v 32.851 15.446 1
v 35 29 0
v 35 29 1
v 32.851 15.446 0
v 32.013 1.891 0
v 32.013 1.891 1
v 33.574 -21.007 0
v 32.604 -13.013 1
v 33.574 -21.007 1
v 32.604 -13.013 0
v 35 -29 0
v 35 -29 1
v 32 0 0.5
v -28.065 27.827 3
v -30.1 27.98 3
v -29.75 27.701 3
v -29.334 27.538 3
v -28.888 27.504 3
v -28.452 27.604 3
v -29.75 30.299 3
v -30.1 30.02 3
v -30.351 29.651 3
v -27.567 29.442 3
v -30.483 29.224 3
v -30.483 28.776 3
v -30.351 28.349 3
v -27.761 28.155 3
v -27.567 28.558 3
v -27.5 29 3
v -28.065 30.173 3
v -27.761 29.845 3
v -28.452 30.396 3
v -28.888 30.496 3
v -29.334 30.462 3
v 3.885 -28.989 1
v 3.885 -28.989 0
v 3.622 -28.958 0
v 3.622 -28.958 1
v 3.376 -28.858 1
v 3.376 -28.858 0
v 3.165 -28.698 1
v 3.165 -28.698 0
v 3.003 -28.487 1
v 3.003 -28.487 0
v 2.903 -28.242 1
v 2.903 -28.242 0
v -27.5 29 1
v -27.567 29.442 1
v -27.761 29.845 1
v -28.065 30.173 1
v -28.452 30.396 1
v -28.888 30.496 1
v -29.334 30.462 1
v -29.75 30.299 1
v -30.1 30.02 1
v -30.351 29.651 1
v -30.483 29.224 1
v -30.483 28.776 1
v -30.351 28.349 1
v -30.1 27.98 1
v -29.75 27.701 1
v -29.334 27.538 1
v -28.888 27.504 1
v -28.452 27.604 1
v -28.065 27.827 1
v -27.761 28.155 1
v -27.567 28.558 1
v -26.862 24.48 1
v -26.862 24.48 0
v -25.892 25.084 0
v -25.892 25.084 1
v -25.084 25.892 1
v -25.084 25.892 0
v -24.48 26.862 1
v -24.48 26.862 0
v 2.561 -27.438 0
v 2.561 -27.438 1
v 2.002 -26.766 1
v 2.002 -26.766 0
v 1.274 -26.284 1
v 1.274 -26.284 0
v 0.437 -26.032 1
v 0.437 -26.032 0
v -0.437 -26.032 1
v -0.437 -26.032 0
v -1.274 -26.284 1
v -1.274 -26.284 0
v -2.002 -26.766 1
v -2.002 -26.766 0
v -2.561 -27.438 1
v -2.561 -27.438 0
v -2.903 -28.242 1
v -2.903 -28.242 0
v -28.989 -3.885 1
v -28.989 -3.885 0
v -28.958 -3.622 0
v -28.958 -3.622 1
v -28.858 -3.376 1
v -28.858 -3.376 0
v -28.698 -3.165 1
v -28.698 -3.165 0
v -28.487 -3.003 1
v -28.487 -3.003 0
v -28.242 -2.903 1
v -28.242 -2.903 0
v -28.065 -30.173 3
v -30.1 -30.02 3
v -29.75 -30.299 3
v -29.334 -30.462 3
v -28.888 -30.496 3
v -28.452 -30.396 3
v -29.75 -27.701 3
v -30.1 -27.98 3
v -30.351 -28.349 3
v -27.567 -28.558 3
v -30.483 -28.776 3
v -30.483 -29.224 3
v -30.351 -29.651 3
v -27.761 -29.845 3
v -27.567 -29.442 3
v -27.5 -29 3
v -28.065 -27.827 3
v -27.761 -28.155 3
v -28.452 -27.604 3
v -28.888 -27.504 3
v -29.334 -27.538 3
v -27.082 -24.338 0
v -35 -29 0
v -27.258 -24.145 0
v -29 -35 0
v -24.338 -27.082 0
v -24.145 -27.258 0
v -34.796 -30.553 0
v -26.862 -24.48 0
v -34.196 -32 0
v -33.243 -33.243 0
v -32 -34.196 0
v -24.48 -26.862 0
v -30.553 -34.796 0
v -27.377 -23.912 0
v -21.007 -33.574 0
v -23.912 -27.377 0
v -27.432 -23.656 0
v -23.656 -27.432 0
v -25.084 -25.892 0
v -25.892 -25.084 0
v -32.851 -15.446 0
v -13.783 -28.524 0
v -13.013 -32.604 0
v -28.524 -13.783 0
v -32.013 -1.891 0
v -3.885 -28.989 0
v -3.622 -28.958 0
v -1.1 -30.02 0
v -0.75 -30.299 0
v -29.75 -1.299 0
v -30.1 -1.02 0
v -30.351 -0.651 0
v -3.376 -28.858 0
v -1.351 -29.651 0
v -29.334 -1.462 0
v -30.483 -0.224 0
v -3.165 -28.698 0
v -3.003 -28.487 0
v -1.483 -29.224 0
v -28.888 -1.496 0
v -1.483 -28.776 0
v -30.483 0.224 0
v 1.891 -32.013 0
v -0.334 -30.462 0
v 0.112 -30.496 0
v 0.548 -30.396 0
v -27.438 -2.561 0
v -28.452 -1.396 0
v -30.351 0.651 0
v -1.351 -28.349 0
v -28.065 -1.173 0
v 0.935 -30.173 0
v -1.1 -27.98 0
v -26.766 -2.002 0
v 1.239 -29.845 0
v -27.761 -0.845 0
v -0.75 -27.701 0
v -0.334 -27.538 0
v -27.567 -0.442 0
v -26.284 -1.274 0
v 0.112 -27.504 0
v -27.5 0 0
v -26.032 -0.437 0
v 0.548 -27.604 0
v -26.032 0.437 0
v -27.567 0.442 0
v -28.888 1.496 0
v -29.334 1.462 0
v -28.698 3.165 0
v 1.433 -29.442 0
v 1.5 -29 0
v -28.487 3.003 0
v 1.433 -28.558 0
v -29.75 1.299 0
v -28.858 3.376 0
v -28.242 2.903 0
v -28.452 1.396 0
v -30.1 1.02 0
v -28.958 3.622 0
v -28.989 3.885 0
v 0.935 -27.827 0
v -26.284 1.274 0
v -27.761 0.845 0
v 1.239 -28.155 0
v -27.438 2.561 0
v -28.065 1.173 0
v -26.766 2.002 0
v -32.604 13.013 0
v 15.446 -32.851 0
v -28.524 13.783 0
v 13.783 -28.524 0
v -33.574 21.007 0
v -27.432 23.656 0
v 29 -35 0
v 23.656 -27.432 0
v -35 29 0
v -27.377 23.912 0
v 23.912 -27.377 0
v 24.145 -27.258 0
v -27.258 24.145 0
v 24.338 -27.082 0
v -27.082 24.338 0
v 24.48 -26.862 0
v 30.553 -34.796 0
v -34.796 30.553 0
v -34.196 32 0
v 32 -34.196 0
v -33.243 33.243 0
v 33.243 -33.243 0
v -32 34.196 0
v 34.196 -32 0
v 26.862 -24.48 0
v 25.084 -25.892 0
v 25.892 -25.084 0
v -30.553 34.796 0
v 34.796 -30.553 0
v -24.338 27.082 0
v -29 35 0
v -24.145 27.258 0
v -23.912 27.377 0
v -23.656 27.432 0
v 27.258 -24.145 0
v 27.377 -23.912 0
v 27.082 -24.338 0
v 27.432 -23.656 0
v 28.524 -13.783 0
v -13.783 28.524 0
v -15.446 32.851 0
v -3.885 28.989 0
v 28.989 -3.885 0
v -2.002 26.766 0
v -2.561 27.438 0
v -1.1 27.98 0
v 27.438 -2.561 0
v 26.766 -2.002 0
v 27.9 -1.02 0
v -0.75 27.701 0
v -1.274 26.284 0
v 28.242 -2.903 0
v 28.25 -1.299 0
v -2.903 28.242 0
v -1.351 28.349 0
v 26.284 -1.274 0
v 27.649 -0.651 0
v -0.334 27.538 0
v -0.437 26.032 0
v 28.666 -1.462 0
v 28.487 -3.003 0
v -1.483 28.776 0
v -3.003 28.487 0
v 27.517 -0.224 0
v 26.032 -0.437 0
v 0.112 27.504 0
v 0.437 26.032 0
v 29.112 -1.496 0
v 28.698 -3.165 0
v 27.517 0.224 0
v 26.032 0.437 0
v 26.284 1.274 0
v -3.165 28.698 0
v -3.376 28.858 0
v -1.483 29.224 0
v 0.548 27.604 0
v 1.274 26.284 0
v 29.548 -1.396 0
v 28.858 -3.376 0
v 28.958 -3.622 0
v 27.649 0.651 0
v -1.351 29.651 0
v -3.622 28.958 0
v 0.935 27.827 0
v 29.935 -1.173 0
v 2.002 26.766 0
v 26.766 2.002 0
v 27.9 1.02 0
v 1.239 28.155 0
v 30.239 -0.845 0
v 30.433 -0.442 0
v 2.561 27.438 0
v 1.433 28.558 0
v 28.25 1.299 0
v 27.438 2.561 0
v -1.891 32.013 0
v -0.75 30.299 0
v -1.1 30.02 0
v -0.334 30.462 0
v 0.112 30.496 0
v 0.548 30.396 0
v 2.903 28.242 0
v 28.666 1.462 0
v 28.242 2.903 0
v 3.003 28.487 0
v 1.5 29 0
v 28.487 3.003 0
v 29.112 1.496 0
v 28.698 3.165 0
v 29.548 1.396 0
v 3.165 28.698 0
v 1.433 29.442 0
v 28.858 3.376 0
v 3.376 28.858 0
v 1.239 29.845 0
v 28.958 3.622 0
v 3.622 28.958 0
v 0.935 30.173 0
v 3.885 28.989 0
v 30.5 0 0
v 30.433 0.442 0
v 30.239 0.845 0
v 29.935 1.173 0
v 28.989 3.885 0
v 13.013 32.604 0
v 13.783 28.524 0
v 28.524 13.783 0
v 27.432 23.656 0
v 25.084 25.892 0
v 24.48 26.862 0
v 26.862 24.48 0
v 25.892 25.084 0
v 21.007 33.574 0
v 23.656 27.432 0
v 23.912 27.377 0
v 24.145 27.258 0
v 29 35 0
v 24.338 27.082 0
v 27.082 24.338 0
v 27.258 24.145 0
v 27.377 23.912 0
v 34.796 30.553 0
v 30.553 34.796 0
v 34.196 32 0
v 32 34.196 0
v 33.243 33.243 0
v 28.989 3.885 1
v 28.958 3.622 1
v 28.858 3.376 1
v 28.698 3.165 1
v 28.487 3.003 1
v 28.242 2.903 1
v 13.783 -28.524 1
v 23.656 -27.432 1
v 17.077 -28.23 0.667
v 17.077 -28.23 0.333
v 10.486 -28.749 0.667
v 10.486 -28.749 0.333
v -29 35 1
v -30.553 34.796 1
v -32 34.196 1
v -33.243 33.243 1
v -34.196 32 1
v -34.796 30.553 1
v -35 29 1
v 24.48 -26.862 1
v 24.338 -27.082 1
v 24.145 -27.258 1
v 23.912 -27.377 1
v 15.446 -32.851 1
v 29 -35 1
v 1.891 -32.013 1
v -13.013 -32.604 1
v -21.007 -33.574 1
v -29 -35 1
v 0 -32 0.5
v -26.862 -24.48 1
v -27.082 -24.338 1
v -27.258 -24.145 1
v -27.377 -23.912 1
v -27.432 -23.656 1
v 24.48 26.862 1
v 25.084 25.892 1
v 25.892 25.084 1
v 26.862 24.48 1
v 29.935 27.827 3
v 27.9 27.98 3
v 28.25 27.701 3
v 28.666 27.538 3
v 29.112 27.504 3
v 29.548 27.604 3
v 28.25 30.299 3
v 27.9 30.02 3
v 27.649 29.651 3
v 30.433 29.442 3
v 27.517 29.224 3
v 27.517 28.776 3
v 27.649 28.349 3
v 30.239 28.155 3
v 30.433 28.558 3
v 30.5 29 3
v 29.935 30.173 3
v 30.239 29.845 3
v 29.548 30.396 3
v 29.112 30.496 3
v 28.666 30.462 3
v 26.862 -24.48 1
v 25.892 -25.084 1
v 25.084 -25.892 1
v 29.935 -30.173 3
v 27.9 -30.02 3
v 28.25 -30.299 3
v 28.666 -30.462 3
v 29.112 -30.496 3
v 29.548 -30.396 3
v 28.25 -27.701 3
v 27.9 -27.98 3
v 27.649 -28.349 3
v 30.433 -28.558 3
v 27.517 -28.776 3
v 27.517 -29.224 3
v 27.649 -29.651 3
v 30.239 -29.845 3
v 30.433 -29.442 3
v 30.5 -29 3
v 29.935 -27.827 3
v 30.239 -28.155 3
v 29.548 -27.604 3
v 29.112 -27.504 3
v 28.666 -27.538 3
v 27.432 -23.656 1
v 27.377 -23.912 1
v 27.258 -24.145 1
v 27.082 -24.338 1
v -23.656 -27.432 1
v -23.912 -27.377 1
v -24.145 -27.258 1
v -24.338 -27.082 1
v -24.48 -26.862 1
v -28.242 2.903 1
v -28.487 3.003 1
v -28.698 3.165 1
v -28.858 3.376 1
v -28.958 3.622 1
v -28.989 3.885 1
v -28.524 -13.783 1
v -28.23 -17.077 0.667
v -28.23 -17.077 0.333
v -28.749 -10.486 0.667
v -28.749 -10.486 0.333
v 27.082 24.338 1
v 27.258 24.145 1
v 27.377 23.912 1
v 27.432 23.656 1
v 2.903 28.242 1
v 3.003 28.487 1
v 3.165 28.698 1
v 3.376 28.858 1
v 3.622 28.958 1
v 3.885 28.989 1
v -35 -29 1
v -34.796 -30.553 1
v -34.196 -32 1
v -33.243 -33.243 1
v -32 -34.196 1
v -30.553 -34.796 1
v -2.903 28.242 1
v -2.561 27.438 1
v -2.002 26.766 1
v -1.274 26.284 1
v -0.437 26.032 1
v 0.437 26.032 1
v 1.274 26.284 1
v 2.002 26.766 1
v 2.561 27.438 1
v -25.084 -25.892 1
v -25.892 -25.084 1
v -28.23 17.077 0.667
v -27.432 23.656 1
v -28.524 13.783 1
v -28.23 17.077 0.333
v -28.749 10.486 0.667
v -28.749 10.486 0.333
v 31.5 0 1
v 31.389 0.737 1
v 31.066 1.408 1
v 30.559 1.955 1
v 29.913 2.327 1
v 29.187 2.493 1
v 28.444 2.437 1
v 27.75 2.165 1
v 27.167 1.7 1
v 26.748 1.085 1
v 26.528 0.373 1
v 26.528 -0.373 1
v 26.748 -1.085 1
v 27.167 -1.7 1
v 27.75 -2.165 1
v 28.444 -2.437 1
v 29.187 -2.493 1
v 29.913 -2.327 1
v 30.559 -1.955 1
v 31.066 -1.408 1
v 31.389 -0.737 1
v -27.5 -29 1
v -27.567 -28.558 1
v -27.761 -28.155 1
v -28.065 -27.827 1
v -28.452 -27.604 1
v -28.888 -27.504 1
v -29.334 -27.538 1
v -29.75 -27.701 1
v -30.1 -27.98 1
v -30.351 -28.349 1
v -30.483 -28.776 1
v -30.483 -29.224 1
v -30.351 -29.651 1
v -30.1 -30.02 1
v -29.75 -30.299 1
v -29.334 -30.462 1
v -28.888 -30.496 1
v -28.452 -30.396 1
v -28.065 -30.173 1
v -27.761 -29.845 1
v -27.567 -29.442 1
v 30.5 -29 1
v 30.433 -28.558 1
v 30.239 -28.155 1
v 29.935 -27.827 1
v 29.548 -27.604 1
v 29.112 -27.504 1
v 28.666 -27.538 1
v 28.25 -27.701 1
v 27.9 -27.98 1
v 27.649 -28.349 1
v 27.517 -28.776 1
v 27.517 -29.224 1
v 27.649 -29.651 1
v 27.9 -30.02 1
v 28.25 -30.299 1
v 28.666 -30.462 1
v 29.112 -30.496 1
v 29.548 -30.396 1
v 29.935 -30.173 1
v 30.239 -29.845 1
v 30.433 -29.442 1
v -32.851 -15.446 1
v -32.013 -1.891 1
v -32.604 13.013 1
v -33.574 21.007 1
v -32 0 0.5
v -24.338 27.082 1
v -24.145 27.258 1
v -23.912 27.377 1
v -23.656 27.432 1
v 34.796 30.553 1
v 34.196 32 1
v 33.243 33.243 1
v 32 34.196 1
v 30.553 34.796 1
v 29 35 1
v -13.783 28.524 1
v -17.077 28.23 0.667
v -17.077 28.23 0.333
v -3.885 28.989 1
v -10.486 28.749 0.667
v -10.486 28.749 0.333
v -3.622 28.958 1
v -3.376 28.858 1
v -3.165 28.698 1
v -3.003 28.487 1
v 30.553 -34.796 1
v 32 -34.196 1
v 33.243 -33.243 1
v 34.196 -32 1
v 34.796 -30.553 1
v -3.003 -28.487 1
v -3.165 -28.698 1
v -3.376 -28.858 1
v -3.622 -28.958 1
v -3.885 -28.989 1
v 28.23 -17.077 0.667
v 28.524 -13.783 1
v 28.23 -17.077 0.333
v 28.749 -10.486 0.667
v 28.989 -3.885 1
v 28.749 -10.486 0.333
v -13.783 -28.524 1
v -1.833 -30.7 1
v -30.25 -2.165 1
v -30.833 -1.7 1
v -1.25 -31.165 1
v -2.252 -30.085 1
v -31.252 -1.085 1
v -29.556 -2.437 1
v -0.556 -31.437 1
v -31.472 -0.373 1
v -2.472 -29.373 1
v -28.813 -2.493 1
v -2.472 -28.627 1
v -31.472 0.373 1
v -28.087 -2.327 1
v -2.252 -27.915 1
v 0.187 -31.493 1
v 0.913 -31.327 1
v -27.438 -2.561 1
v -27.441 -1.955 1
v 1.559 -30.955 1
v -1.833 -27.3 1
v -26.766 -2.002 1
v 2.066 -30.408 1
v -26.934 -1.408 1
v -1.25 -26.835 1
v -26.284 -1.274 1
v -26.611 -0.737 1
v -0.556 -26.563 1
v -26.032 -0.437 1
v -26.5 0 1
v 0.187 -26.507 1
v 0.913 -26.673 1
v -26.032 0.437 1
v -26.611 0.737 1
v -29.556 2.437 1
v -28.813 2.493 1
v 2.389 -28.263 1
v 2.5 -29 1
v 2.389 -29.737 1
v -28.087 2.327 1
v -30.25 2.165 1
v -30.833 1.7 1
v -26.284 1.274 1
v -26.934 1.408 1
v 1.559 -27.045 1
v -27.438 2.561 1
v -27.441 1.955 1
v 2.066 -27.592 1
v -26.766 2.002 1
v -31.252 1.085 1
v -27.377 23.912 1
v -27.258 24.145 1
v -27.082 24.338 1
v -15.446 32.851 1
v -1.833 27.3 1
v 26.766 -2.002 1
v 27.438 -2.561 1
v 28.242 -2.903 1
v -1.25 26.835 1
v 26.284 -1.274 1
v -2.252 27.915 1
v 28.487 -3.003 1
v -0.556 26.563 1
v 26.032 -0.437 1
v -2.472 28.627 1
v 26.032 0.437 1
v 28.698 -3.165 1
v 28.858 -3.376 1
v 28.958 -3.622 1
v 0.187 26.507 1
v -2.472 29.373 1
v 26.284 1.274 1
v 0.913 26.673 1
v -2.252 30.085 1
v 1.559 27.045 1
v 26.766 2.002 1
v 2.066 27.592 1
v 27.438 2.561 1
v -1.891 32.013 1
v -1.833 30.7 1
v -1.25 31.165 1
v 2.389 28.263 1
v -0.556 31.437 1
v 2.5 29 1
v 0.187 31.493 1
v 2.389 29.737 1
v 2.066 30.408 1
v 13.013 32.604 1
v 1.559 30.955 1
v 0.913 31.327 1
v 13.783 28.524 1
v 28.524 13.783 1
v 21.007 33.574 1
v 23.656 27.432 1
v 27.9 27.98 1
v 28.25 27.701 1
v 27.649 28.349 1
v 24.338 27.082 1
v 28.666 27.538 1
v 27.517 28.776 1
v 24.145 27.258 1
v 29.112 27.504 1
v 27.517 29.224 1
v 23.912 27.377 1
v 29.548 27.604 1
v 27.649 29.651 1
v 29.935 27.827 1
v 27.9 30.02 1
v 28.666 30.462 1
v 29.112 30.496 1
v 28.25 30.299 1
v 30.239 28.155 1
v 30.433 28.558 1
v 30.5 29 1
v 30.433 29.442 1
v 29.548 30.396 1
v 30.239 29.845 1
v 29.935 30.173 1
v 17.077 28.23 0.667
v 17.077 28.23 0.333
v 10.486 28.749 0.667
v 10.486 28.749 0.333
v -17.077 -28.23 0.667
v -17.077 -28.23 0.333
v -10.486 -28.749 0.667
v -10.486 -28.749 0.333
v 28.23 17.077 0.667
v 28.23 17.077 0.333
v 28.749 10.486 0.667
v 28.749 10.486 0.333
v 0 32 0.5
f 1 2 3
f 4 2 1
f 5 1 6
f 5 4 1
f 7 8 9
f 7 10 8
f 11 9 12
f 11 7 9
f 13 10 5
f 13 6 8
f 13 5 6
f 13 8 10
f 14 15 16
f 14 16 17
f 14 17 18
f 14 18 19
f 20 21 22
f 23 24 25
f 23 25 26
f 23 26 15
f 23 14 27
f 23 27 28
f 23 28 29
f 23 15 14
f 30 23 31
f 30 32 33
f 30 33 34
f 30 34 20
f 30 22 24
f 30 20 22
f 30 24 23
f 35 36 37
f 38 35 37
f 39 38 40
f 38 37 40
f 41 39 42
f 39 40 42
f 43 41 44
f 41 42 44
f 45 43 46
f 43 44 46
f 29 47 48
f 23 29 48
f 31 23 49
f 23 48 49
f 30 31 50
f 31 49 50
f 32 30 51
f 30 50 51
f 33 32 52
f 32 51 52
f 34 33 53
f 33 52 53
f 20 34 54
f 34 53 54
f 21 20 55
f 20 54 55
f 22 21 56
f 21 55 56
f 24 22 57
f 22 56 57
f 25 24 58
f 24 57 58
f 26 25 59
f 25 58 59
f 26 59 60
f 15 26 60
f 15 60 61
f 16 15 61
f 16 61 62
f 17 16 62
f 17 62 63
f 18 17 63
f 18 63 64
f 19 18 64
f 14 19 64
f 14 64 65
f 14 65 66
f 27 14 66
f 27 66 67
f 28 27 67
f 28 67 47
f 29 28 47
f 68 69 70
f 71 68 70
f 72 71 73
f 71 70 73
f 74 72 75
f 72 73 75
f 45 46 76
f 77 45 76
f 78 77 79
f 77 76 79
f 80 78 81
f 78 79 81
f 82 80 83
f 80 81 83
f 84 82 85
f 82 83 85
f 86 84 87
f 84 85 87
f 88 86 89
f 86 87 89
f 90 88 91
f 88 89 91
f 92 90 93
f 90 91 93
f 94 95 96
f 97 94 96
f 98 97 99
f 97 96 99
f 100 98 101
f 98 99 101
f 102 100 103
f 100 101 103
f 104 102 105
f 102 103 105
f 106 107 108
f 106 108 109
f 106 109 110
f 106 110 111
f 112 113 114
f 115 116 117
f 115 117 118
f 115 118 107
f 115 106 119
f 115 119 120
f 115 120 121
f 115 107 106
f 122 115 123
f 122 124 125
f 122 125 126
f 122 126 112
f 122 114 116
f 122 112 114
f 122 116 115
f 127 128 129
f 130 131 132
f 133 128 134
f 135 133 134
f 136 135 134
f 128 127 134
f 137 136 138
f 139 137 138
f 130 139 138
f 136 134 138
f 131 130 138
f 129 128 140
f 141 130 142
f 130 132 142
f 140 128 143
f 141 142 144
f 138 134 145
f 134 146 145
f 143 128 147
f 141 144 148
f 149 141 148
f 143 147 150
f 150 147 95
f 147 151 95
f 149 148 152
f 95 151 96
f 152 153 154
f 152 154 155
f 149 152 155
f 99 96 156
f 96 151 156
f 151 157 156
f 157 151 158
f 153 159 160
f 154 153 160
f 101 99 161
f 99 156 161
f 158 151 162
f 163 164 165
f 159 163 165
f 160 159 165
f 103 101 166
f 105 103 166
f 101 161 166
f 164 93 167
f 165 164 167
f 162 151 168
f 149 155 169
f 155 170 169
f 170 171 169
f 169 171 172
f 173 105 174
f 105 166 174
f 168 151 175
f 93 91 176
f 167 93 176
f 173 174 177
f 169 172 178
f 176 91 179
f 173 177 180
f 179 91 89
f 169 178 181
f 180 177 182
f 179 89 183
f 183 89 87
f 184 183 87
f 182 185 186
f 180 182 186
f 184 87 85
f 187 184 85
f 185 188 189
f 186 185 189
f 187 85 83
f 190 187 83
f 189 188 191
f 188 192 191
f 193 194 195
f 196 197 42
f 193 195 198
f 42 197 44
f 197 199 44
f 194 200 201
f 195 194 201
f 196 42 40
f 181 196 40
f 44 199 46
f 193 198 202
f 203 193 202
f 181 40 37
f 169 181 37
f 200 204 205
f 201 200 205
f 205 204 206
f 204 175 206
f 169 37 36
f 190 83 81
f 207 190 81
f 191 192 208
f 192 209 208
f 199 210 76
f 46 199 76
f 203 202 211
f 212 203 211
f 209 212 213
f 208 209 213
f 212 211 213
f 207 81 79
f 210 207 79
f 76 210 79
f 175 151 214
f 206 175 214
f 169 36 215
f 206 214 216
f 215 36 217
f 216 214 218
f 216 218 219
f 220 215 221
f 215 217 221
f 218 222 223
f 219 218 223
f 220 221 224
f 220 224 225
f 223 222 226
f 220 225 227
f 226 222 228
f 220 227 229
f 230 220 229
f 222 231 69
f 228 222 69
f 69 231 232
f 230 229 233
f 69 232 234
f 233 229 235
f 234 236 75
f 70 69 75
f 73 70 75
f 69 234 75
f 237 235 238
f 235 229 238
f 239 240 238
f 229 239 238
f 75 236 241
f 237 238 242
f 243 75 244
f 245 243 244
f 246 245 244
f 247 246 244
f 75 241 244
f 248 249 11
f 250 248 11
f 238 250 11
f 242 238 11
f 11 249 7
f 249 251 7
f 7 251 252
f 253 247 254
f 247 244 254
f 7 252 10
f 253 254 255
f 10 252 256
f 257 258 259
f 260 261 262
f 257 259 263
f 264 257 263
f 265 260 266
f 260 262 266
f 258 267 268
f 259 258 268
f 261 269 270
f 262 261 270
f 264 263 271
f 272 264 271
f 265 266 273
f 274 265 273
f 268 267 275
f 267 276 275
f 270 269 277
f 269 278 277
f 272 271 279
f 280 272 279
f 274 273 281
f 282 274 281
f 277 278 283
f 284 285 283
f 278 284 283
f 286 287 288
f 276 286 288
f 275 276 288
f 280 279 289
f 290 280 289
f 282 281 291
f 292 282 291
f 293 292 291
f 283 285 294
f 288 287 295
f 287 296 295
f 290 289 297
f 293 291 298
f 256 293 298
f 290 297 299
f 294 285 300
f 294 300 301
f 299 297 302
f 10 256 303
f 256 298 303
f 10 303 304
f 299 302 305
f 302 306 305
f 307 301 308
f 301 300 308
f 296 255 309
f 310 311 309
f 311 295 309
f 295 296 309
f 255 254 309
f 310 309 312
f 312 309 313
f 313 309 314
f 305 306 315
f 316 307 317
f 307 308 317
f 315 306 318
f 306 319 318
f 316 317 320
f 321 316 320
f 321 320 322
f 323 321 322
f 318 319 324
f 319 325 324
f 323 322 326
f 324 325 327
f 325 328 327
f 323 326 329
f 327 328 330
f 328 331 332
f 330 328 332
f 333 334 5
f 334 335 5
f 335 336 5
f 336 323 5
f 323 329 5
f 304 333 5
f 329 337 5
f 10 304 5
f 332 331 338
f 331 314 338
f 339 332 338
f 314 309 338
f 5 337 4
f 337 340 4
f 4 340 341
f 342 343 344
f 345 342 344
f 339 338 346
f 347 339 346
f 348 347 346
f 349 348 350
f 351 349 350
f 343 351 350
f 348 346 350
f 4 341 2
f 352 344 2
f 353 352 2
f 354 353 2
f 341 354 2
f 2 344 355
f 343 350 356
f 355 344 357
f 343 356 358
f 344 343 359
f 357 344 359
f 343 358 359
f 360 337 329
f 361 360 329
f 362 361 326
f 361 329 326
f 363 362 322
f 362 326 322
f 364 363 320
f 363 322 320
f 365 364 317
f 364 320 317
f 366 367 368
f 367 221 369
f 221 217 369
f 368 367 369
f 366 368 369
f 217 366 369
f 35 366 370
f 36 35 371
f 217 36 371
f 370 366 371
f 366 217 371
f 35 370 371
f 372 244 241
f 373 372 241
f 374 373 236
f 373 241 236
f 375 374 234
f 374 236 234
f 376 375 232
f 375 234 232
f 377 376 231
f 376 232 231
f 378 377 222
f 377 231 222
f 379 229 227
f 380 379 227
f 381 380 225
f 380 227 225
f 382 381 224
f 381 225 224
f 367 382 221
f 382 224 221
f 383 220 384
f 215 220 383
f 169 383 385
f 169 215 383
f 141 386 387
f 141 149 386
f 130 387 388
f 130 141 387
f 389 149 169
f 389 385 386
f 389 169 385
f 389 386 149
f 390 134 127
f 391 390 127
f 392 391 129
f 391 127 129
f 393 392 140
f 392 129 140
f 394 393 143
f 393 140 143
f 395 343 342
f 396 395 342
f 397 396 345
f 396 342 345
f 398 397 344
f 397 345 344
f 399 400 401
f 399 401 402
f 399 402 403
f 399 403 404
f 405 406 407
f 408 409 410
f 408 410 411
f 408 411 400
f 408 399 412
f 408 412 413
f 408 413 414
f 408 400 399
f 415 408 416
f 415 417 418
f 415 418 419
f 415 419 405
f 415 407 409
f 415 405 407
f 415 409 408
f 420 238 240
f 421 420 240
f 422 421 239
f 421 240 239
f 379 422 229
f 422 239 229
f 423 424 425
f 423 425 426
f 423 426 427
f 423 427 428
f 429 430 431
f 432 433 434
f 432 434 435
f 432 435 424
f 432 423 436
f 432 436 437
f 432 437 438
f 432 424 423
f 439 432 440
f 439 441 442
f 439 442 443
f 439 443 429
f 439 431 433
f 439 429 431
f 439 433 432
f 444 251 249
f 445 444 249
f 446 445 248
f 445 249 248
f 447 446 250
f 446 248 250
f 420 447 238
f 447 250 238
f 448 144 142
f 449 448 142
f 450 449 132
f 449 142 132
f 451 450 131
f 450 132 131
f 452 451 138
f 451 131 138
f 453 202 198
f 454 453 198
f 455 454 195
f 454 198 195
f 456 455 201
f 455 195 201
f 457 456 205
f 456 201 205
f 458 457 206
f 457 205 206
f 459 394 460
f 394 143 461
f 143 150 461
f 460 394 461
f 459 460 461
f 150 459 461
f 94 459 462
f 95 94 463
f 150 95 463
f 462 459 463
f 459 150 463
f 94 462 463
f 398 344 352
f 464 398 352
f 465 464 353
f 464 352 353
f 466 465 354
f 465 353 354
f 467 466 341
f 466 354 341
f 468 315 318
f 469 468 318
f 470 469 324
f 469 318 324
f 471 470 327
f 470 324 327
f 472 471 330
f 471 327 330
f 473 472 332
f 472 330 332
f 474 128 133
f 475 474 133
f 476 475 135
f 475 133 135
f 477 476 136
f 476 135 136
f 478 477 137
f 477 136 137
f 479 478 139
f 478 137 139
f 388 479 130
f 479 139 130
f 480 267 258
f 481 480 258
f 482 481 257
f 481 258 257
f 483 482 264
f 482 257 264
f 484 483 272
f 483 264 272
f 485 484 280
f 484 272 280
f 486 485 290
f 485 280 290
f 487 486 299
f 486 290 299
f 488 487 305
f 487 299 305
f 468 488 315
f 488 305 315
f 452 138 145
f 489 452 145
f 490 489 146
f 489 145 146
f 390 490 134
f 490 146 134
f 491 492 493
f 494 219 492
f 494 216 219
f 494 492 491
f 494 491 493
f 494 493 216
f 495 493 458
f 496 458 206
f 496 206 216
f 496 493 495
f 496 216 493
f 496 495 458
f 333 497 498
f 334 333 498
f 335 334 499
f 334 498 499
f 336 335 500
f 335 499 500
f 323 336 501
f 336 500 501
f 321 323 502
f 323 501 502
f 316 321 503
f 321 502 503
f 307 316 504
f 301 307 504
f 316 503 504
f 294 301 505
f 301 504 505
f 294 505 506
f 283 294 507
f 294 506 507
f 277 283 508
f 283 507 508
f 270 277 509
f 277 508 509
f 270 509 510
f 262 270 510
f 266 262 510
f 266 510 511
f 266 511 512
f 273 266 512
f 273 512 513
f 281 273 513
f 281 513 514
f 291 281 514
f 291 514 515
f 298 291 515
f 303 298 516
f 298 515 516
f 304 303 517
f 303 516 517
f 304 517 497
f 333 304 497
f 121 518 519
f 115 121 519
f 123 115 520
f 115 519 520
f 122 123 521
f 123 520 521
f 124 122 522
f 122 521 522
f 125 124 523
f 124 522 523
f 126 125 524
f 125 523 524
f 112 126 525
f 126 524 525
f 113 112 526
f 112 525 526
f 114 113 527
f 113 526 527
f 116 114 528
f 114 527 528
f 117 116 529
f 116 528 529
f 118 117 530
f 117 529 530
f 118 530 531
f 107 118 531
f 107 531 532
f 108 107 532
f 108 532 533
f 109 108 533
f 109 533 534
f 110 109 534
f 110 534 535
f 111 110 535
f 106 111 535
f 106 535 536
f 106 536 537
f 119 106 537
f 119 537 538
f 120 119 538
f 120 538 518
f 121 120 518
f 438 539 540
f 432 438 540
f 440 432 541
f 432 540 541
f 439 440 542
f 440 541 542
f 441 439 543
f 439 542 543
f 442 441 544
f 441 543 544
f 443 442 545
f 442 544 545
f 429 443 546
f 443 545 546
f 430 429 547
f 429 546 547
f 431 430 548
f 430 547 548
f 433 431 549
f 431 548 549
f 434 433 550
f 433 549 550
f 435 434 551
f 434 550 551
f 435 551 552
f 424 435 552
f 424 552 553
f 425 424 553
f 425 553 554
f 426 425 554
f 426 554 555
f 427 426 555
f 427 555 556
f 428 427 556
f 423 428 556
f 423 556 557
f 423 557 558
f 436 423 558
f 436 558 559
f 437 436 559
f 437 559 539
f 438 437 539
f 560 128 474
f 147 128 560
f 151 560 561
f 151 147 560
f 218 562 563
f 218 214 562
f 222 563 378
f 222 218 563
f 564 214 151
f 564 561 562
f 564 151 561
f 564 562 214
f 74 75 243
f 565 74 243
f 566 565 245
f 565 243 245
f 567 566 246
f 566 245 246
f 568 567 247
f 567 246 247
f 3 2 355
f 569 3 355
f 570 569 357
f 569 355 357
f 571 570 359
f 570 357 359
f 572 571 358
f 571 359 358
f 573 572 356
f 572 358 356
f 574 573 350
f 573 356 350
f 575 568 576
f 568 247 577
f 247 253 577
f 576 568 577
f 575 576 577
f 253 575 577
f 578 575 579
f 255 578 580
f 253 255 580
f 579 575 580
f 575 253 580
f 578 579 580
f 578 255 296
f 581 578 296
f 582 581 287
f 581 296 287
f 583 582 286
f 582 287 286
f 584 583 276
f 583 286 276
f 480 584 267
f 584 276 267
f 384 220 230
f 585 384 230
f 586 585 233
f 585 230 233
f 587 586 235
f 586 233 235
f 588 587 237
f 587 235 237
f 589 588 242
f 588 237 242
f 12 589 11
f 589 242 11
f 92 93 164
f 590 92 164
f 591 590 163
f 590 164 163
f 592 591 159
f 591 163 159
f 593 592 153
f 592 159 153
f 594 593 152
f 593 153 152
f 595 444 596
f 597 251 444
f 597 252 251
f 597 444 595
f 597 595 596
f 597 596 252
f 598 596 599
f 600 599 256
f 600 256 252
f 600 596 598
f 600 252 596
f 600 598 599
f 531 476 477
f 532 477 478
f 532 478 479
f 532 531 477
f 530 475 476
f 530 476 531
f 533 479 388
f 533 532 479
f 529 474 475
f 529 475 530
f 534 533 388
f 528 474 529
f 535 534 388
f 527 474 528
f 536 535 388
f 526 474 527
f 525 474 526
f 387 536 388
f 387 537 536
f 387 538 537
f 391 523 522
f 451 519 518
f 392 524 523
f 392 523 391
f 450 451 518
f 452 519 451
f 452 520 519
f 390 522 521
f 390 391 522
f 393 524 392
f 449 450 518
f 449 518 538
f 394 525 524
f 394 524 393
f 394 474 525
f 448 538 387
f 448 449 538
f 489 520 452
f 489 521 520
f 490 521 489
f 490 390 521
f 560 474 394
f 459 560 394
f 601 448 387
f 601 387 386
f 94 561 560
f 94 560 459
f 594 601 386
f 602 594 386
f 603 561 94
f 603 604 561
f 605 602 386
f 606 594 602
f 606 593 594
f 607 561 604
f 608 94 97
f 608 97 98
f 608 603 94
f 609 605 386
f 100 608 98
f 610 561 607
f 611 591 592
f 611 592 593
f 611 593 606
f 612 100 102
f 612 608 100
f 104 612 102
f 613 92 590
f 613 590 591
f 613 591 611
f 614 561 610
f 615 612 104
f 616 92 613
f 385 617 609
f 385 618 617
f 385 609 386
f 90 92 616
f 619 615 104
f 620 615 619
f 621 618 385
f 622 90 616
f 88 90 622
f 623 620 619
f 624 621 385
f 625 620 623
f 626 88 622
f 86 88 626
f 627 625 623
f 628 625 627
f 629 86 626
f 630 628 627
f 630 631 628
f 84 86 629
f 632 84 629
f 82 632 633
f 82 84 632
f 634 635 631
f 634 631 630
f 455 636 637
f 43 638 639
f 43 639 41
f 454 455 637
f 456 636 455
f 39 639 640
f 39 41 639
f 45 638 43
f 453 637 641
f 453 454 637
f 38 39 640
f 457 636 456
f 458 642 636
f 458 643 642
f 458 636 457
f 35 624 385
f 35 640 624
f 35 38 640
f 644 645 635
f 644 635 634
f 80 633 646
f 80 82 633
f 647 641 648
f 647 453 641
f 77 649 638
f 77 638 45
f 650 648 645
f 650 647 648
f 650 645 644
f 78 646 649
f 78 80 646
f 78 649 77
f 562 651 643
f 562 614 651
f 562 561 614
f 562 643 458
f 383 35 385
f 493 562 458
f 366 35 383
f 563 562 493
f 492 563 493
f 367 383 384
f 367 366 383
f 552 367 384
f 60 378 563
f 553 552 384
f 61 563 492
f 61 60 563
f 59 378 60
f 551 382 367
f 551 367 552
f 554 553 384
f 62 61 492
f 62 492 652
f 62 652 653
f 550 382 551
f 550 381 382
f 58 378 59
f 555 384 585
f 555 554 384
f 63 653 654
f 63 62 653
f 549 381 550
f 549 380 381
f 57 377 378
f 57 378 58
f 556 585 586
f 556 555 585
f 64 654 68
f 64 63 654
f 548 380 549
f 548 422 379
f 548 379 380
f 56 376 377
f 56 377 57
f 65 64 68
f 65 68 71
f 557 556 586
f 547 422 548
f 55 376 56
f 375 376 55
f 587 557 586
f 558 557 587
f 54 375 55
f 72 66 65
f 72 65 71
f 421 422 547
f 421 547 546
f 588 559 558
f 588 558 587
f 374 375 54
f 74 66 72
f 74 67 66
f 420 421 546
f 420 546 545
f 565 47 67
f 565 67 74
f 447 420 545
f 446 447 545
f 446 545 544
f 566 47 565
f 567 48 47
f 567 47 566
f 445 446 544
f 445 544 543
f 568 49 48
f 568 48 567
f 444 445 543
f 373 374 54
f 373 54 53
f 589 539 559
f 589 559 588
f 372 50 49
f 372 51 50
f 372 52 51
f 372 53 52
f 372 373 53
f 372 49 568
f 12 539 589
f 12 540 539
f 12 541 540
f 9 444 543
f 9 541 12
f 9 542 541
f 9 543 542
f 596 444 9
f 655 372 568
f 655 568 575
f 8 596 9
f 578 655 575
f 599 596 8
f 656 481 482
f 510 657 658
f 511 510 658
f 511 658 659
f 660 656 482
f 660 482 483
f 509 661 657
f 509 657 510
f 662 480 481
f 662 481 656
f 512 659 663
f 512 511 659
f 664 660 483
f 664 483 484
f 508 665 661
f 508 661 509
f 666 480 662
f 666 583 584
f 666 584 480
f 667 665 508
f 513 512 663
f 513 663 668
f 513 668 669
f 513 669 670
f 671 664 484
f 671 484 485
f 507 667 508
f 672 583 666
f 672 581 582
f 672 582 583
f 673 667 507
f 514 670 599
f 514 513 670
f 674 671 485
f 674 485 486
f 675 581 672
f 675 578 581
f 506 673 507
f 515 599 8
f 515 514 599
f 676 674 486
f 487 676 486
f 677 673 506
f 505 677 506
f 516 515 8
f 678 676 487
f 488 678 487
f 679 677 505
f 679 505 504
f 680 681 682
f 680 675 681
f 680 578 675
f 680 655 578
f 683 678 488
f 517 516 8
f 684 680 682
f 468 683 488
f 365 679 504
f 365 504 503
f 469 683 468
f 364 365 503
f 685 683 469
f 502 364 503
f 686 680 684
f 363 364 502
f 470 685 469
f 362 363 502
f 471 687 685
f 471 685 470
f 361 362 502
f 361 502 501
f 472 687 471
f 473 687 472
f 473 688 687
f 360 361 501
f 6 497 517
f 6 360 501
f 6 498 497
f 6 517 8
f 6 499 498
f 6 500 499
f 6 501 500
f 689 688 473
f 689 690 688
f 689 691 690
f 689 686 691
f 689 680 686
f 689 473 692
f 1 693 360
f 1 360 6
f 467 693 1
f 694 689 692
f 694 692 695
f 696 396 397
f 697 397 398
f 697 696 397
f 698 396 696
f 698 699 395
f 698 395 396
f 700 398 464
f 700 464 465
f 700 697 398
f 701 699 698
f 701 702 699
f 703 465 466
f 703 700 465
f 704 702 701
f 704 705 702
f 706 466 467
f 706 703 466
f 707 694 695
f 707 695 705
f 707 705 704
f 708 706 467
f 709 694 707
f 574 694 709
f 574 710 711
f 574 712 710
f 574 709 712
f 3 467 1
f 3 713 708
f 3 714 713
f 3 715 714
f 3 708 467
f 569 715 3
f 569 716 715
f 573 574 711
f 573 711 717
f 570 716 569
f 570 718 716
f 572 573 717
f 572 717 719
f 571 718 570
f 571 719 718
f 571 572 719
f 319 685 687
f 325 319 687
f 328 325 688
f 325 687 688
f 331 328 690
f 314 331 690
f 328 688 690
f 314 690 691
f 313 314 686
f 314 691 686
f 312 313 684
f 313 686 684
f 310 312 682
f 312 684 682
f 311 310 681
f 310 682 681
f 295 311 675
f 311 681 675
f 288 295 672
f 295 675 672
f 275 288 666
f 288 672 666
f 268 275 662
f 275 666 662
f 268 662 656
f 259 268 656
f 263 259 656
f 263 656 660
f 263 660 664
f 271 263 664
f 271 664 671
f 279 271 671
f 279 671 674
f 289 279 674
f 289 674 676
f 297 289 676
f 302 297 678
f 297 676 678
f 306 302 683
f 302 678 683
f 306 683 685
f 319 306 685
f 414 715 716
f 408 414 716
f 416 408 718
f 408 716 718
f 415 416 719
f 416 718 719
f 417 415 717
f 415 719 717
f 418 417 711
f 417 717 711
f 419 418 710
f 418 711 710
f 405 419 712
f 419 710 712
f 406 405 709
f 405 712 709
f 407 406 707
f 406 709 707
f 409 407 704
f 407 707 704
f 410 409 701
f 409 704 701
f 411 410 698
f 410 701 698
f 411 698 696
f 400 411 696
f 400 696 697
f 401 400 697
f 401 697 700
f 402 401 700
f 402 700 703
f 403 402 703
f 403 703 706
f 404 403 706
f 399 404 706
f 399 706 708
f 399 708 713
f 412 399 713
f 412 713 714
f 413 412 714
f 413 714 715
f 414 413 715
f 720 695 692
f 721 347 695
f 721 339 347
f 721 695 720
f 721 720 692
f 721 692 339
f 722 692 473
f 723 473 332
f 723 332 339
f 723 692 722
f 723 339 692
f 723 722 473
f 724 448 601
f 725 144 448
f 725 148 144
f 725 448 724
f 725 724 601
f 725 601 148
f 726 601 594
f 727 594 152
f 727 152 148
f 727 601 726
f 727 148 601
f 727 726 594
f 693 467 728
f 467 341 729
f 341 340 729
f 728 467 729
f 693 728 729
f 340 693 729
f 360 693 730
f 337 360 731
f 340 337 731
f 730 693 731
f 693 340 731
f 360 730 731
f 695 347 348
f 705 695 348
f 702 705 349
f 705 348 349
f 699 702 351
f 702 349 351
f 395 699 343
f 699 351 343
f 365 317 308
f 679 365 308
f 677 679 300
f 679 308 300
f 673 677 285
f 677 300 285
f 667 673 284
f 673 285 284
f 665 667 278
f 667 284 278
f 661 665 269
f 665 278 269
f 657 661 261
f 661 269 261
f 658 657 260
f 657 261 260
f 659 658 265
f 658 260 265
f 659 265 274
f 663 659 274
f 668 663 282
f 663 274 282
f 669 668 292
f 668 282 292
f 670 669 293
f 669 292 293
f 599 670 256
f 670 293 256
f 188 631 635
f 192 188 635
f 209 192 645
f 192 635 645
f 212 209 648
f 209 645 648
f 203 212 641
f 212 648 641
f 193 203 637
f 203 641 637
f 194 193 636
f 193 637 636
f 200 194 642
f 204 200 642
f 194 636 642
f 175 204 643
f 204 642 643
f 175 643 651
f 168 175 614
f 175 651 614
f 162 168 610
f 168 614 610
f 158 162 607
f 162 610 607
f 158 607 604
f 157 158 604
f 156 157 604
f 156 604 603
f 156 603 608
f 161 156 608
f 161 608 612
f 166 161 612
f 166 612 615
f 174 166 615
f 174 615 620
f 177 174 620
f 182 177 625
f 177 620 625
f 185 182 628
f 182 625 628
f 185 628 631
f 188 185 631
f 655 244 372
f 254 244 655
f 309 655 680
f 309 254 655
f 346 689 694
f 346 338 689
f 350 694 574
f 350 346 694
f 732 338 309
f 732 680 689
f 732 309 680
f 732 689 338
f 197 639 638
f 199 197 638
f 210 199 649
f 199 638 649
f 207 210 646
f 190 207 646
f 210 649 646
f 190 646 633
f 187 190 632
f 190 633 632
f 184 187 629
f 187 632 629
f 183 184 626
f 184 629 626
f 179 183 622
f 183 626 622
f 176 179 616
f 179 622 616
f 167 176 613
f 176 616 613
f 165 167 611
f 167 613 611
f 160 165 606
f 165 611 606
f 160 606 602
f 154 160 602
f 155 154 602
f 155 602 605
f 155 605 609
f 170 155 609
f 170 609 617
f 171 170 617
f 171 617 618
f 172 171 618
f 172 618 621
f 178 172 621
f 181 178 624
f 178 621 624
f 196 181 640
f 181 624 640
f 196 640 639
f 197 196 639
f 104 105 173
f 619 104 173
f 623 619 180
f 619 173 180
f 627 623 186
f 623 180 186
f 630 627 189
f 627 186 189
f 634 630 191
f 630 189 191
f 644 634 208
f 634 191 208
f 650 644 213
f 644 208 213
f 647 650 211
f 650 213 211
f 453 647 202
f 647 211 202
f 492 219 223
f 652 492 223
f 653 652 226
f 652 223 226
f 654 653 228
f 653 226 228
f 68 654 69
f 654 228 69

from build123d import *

# Parameters (mm, degrees)
IZIM3_R                          = 1.5
Y_KSEKLIK_EKSTR_ZYON3_DEPTH      = 1
PAH1_SIZE                        = 1
Y_KSEKLIK_EKSTR_ZYON5_DEPTH      = 2
Y_KSEKLIK_EKSTR_ZYON5_DEPTH_BACK = 1
IZIM5_R                          = 1.5
Y_KSEKLIK_EKSTR_ZYON4_DEPTH      = 2
Y_KSEKLIK_EKSTR_ZYON4_DEPTH_BACK = 1
IZIM4_R                          = 1.5


with BuildPart() as part:
    # Çizim3 → Yükseklik-Ekstrüzyon3 (new body)
    with BuildSketch(Plane.XY):
        with BuildLine():
            ThreePointArc((-29, 35), (-33.242640687, 33.242640687), (-35, 29))
            add(Edge.make_bspline(
                [(-35, -29), (-29, 0), (-35, 29)],
                knots=[0, 0, 0, 1, 1, 1], degree=2))
            ThreePointArc((-35, -29), (-33.242640687, -33.242640687), (-29, -35))
            add(Edge.make_bspline(
                [(29, -35), (0, -29), (-29, -35)],
                knots=[0, 0, 0, 1, 1, 1], degree=2))
            ThreePointArc((29, -35), (33.242640687, -33.242640687), (35, -29))
            add(Edge.make_bspline(
                [(35, 29), (29, 0), (35, -29)],
                knots=[0, 0, 0, 1, 1, 1], degree=2))
            ThreePointArc((35, 29), (33.242640687, 33.242640687), (29, 35))
            add(Edge.make_bspline(
                [(-29, 35), (0, 29), (29, 35)],
                knots=[0, 0, 0, 1, 1, 1], degree=2))
        make_face()
        with Locations((0, -29)):
            Circle(IZIM3_R, mode=Mode.SUBTRACT)
        with Locations((-29, 0)):
            Circle(IZIM3_R, mode=Mode.SUBTRACT)
        with Locations((-29, 29)):
            Circle(IZIM3_R, mode=Mode.SUBTRACT)
        with Locations((29, 29)):
            Circle(IZIM3_R, mode=Mode.SUBTRACT)
        with Locations((-29, -29)):
            Circle(IZIM3_R, mode=Mode.SUBTRACT)
        with Locations((29, -29)):
            Circle(IZIM3_R, mode=Mode.SUBTRACT)
        with Locations((0, 29)):
            Circle(IZIM3_R, mode=Mode.SUBTRACT)
        with Locations((29, 0)):
            Circle(IZIM3_R, mode=Mode.SUBTRACT)
        with BuildLine():
            ThreePointArc((-24.479955031, -26.862432812), (-25.464466094, -25.464466094), (-26.862432812, -24.479955031))
            ThreePointArc((-26.862432812, -24.479955031), (-27.257516743, -24.144570316), (-27.431672227, -23.65646778))
            add(Edge.make_bspline(
                [(-27.431672227, -23.65646778), (-28.369214102, -17.081973168), (-28.888327363, -10.491616934), (-28.989012012, -3.885399076)],
                knots=[0, 0, 0, 0, 0.836151593, 0.836151593, 0.836151593, 0.836151593], degree=3))
            ThreePointArc((-28.989012012, -3.885399076), (-28.785191285, -3.264946388), (-28.241846101, -2.902619966))
            ThreePointArc((-28.241846101, -2.902619966), (-26, 0), (-28.241846101, 2.902619966))
            ThreePointArc((-28.241846101, 2.902619966), (-28.785191285, 3.264946388), (-28.989012012, 3.885399076))
            add(Edge.make_bspline(
                [(-27.431672227, 23.65646778), (-28.369214102, 17.081973168), (-28.888327363, 10.491616934), (-28.989012012, 3.885399076)],
                knots=[0, 0, 0, 0, 0.836151593, 0.836151593, 0.836151593, 0.836151593], degree=3))
            ThreePointArc((-27.431672227, 23.65646778), (-27.257516743, 24.144570316), (-26.862432812, 24.479955031))
            ThreePointArc((-26.862432812, 24.479955031), (-25.464466094, 25.464466094), (-24.479955031, 26.862432812))
            ThreePointArc((-24.479955031, 26.862432812), (-24.144570316, 27.257516743), (-23.65646778, 27.431672227))
            add(Edge.make_bspline(
                [(-23.65646778, 27.431672227), (-17.081973168, 28.369214102), (-10.491616934, 28.888327363), (-3.885399076, 28.989012012)],
                knots=[0, 0, 0, 0, 0.836151593, 0.836151593, 0.836151593, 0.836151593], degree=3))
            ThreePointArc((-3.885399076, 28.989012012), (-3.264946388, 28.785191285), (-2.902619966, 28.241846101))
            ThreePointArc((-2.902619966, 28.241846101), (0, 26), (2.902619966, 28.241846101))
            ThreePointArc((2.902619966, 28.241846101), (3.264946388, 28.785191285), (3.885399076, 28.989012012))
            add(Edge.make_bspline(
                [(23.65646778, 27.431672227), (17.081973168, 28.369214102), (10.491616934, 28.888327363), (3.885399076, 28.989012012)],
                knots=[0, 0, 0, 0, 0.836151593, 0.836151593, 0.836151593, 0.836151593], degree=3))
            ThreePointArc((23.65646778, 27.431672227), (24.144570316, 27.257516743), (24.479955031, 26.862432812))
            ThreePointArc((24.479955031, 26.862432812), (25.464466094, 25.464466094), (26.862432812, 24.479955031))
            ThreePointArc((26.862432812, 24.479955031), (27.257516743, 24.144570316), (27.431672227, 23.65646778))
            add(Edge.make_bspline(
                [(27.431672227, 23.65646778), (28.369214102, 17.081973168), (28.888327363, 10.491616934), (28.989012012, 3.885399076)],
                knots=[0, 0, 0, 0, 0.836151593, 0.836151593, 0.836151593, 0.836151593], degree=3))
            ThreePointArc((28.989012012, 3.885399076), (28.785191285, 3.264946389), (28.241846101, 2.902619966))
            ThreePointArc((28.241846101, 2.902619966), (26, 0), (28.241846101, -2.902619966))
            ThreePointArc((28.241846101, -2.902619966), (28.785191285, -3.264946388), (28.989012012, -3.885399076))
            add(Edge.make_bspline(
                [(27.431672227, -23.65646778), (28.369214102, -17.081973168), (28.888327363, -10.491616934), (28.989012012, -3.885399076)],
                knots=[0, 0, 0, 0, 0.836151593, 0.836151593, 0.836151593, 0.836151593], degree=3))
            ThreePointArc((27.431672227, -23.65646778), (27.257516743, -24.144570316), (26.862432812, -24.479955031))
            ThreePointArc((26.862432812, -24.479955031), (25.464466094, -25.464466094), (24.479955031, -26.862432812))
            ThreePointArc((24.479955031, -26.862432812), (24.144570316, -27.257516743), (23.65646778, -27.431672227))
            add(Edge.make_bspline(
                [(23.65646778, -27.431672227), (17.081973168, -28.369214102), (10.491616934, -28.888327363), (3.885399076, -28.989012012)],
                knots=[0, 0, 0, 0, 0.836151593, 0.836151593, 0.836151593, 0.836151593], degree=3))
            ThreePointArc((3.885399076, -28.989012012), (3.264946388, -28.785191285), (2.902619966, -28.241846101))
            ThreePointArc((2.902619966, -28.241846101), (0, -26), (-2.902619966, -28.241846101))
            ThreePointArc((-2.902619966, -28.241846101), (-3.264946388, -28.785191285), (-3.885399076, -28.989012012))
            add(Edge.make_bspline(
                [(-23.65646778, -27.431672227), (-17.081973168, -28.369214102), (-10.491616934, -28.888327363), (-3.885399076, -28.989012012)],
                knots=[0, 0, 0, 0, 0.836151593, 0.836151593, 0.836151593, 0.836151593], degree=3))
            ThreePointArc((-23.65646778, -27.431672227), (-24.144570316, -27.257516743), (-24.479955031, -26.862432812))
        make_face(mode=Mode.SUBTRACT)
    extrude(amount=Y_KSEKLIK_EKSTR_ZYON3_DEPTH)

    # Pah1
    pah1_edges = [part.edges().sort_by_distance(p)[0] for p in [
        (-1.5, 29, 1),
        (27.5, 0, 1),
        (-1.5, -29, 1),
        (-30.5, 0, 1),
    ]]
    chamfer(pah1_edges, length=PAH1_SIZE - 0.0001)  # a hair under: the kernel refuses the full size

    # Çizim5 → Yükseklik-Ekstrüzyon5 (add, two sides: drawn at the far end of the back side and taken through both)
    with BuildSketch(Plane.XY.offset(1).offset(-Y_KSEKLIK_EKSTR_ZYON5_DEPTH_BACK)):
        with Locations((-29, 29)):
            Circle(IZIM5_R)
        with Locations((29, 29)):
            Circle(IZIM5_R)
        with Locations((29, -29)):
            Circle(IZIM5_R)
        with Locations((-29, -29)):
            Circle(IZIM5_R)
    extrude(amount=Y_KSEKLIK_EKSTR_ZYON5_DEPTH + Y_KSEKLIK_EKSTR_ZYON5_DEPTH_BACK)

    # Çizim4 → Yükseklik-Ekstrüzyon4 (add, two sides: drawn at the far end of the back side and taken through both)
    with BuildSketch(Plane.XY.offset(1).offset(-Y_KSEKLIK_EKSTR_ZYON4_DEPTH_BACK)):
        with Locations((-29, 29)):
            Circle(IZIM4_R)
        with Locations((29, 29)):
            Circle(IZIM4_R)
        with Locations((29, -29)):
            Circle(IZIM4_R)
        with Locations((-29, -29)):
            Circle(IZIM4_R)
    extrude(amount=Y_KSEKLIK_EKSTR_ZYON4_DEPTH + Y_KSEKLIK_EKSTR_ZYON4_DEPTH_BACK)


solid = part.part
